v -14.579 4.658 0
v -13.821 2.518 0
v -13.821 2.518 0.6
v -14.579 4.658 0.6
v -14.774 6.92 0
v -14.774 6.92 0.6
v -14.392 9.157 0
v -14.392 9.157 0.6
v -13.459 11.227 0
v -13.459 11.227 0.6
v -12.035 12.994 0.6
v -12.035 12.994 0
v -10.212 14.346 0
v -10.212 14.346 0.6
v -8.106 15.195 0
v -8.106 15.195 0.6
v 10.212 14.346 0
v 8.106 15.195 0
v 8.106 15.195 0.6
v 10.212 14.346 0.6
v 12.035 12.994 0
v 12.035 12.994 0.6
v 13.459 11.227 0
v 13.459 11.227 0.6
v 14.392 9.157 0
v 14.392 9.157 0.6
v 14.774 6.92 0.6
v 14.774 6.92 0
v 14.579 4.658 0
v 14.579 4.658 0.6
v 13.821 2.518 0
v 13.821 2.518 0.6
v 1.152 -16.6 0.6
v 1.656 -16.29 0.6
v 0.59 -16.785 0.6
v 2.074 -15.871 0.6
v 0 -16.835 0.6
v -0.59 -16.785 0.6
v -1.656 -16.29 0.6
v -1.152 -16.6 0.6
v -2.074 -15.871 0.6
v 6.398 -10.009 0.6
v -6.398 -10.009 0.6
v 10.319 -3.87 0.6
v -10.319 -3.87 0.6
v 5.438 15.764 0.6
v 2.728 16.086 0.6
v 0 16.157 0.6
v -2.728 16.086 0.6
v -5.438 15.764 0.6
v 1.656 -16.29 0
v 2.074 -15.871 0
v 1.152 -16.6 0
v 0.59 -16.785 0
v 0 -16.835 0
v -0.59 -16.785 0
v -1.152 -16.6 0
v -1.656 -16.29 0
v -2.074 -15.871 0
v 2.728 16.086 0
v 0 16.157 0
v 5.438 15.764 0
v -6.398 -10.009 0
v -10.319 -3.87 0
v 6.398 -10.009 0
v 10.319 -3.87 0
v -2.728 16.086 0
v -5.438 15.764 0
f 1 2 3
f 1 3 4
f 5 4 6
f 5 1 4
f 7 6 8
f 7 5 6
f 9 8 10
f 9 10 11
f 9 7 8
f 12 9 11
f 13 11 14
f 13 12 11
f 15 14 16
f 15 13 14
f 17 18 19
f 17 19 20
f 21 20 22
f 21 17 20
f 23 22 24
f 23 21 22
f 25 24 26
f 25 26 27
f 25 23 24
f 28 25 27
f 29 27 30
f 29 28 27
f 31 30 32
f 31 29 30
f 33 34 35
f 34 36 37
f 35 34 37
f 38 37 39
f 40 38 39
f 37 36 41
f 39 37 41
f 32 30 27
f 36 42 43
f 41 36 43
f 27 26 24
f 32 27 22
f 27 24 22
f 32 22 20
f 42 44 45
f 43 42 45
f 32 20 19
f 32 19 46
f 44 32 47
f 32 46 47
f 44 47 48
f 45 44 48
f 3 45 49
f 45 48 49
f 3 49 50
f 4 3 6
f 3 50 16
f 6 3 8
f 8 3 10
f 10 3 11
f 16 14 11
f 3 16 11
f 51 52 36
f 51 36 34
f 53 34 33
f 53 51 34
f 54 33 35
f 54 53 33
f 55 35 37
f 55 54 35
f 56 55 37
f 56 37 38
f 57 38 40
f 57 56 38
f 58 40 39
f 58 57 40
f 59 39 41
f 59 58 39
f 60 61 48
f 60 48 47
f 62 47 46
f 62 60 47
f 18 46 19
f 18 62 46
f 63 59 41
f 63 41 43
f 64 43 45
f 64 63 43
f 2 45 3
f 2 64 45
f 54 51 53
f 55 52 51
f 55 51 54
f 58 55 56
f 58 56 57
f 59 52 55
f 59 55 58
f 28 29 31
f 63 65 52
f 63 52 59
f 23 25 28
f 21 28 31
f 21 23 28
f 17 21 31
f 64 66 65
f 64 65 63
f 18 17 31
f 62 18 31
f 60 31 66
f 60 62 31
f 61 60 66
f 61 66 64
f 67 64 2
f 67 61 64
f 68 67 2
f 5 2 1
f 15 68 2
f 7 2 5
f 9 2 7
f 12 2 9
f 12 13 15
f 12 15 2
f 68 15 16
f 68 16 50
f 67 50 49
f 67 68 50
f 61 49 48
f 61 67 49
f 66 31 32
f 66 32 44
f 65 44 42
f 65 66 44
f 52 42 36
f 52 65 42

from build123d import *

# Parameters (mm, degrees)
BOSS_EXTRUDE2_DEPTH = 0.6


with BuildPart() as part:
    # Sketch2 → Boss-Extrude2 (new body)
    with BuildSketch(Plane.XY):
        with BuildLine():
            ThreePointArc((2.074223627, -15.871495922), (1.151683238, -16.599881603), (0, -16.834939442))
            ThreePointArc((0, -16.834939442), (-1.151683238, -16.599881603), (-2.074223627, -15.871495922))
            ThreePointArc((-2.074223627, -15.871495922), (-8.410066736, -6.972099792), (-13.820679581, 2.518286292))
            ThreePointArc((-13.820679581, 2.518286292), (-13.991707448, 10.221670001), (-8.106427403, 15.195084311))
            ThreePointArc((-8.106427403, 15.195084311), (-4.08641149, 15.955883205), (0, 16.157338))
            ThreePointArc((0, 16.157338), (4.08641149, 15.955883205), (8.106427403, 15.195084311))
            ThreePointArc((8.106427403, 15.195084311), (13.991707448, 10.221670001), (13.820679581, 2.518286292))
            ThreePointArc((13.820679581, 2.518286292), (8.410066736, -6.972099792), (2.074223627, -15.871495922))
        make_face()
    extrude(amount=BOSS_EXTRUDE2_DEPTH)


solid = part.part
